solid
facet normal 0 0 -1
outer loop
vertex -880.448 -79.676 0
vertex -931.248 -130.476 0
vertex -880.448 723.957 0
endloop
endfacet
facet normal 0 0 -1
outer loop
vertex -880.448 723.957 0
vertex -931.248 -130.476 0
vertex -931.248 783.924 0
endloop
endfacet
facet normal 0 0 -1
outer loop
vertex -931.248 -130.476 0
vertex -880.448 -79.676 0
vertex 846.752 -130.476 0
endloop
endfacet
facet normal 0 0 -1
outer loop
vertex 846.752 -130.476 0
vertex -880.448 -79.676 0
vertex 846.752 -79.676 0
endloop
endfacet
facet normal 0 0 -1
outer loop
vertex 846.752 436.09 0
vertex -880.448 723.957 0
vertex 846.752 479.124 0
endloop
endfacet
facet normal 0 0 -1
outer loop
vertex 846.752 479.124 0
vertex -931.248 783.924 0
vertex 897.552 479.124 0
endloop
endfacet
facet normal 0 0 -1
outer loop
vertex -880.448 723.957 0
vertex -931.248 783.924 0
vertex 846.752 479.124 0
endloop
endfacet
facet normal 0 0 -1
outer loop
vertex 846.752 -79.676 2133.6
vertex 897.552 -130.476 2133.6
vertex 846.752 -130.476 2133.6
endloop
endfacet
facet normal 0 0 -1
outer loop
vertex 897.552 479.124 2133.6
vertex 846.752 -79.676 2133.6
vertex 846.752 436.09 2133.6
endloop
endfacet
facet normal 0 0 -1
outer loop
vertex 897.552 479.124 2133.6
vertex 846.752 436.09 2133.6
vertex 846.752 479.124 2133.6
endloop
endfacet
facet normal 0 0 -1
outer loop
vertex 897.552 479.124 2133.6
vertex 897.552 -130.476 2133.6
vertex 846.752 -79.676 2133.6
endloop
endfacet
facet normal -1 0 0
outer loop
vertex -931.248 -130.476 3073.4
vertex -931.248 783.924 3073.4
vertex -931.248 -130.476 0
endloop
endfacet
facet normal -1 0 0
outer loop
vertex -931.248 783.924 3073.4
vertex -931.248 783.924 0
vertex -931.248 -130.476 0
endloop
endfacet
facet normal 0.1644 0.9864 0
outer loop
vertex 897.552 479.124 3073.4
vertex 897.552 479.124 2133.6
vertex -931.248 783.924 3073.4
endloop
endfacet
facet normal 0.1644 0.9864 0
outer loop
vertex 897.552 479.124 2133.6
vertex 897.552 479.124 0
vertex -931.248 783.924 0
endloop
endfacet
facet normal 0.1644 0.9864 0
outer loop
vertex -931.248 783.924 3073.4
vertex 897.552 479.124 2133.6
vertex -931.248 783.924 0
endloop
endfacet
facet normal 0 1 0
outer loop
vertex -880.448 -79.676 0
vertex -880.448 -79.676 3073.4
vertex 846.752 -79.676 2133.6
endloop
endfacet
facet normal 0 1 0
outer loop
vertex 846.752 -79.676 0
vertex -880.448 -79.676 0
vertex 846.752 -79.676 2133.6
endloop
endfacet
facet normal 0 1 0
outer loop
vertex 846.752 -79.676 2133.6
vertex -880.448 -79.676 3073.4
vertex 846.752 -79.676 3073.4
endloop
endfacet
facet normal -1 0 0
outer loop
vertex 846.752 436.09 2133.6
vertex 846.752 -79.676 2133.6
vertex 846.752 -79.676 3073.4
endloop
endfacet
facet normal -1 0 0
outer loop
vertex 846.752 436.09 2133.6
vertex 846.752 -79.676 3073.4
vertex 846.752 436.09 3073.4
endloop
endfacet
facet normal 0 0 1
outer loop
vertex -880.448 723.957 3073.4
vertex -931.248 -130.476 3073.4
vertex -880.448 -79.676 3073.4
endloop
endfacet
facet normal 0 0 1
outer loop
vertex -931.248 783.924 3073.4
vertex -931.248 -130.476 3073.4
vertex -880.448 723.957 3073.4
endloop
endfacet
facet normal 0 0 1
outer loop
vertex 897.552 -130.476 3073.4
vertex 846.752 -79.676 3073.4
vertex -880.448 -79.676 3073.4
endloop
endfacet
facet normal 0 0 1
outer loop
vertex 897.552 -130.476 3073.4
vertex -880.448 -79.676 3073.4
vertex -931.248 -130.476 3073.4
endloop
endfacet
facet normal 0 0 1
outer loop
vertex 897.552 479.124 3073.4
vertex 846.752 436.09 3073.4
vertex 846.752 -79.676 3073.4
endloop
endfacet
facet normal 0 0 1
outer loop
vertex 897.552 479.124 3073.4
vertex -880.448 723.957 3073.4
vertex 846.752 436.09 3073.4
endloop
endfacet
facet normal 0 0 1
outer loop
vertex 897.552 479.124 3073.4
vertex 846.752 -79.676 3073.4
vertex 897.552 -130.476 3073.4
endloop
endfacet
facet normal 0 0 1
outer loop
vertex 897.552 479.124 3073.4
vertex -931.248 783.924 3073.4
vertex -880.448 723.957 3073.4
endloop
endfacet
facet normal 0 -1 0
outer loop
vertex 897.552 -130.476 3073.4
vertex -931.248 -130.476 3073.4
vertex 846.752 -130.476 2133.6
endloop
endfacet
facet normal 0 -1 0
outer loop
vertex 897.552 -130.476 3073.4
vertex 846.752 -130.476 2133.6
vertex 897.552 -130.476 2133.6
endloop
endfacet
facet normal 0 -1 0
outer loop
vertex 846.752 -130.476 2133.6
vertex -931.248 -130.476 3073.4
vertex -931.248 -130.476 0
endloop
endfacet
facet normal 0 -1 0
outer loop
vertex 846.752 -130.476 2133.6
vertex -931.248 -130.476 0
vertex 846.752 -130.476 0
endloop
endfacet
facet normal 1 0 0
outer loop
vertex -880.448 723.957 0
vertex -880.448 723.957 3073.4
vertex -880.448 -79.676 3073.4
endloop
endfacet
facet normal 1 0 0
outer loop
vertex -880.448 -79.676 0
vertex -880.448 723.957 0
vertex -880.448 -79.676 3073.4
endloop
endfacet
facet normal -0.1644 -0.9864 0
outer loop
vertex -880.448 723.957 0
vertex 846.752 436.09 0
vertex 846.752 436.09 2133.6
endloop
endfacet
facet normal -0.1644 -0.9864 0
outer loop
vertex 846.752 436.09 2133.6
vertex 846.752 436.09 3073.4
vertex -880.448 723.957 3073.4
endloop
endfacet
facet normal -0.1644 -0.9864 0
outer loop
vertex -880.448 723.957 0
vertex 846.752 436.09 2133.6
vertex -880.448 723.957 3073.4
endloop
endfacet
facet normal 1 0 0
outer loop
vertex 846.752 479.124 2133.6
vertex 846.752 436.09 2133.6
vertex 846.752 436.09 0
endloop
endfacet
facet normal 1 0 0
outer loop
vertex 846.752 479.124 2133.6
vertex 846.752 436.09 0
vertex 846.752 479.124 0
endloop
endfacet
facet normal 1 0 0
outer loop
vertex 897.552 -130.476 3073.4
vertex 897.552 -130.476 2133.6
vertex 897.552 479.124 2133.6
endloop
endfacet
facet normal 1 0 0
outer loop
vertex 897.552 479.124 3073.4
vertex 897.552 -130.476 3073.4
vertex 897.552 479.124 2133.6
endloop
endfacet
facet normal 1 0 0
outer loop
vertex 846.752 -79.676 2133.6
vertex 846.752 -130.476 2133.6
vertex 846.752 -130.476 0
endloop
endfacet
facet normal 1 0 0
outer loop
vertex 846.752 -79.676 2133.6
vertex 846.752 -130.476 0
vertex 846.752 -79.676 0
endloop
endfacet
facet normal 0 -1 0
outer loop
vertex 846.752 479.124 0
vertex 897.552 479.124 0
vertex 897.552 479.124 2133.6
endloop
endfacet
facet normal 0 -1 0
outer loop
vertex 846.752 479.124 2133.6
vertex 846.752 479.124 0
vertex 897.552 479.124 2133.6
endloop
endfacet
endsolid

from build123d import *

# Parameters (mm, degrees)
F2_DEPTH = 25.4
F3_DEPTH = 3048
F5_DEPTH = 3302
F6_W     = 609.6
F6_H     = 2133.6
F7_DEPTH = 50.8


with BuildPart() as f2:
    # F1 (on Top) → F2 (new body)
    with BuildSketch(Plane.XY):
        Polygon((-931.248452, 783.924121), (-931.248452, -130.475879), (897.551548, -130.475879), (897.551548, 479.124121), align=None)
    extrude(amount=F2_DEPTH)

    # F2_face (on face) → F3 (join)
    with BuildSketch(Plane(origin=(-77.808452, 255.604121, 25.4), x_dir=(1, 0, 0), z_dir=(0, 0, 1))):
        Polygon((975.36, 223.52), (-853.44, 528.32), (-853.44, -386.08), (975.36, -386.08), align=None)
    extrude(amount=F3_DEPTH)

    # F4 (on face) → F5 (cut)
    with BuildSketch(Plane.XY.offset(3073.4)):
        Polygon((846.751548, -79.675879), (846.751548, 436.090065), (-880.448452, 723.956732), (-880.448452, -79.675879), align=None)
    extrude(amount=-F5_DEPTH, mode=Mode.SUBTRACT)

    # F6 (on face) → F7 (cut)
    with BuildSketch(Plane.YZ.offset(897.551548)):
        with Locations((174.324121, 1066.8)):
            Rectangle(F6_W, F6_H)
    extrude(amount=-F7_DEPTH, mode=Mode.SUBTRACT)


solid = f2.part
